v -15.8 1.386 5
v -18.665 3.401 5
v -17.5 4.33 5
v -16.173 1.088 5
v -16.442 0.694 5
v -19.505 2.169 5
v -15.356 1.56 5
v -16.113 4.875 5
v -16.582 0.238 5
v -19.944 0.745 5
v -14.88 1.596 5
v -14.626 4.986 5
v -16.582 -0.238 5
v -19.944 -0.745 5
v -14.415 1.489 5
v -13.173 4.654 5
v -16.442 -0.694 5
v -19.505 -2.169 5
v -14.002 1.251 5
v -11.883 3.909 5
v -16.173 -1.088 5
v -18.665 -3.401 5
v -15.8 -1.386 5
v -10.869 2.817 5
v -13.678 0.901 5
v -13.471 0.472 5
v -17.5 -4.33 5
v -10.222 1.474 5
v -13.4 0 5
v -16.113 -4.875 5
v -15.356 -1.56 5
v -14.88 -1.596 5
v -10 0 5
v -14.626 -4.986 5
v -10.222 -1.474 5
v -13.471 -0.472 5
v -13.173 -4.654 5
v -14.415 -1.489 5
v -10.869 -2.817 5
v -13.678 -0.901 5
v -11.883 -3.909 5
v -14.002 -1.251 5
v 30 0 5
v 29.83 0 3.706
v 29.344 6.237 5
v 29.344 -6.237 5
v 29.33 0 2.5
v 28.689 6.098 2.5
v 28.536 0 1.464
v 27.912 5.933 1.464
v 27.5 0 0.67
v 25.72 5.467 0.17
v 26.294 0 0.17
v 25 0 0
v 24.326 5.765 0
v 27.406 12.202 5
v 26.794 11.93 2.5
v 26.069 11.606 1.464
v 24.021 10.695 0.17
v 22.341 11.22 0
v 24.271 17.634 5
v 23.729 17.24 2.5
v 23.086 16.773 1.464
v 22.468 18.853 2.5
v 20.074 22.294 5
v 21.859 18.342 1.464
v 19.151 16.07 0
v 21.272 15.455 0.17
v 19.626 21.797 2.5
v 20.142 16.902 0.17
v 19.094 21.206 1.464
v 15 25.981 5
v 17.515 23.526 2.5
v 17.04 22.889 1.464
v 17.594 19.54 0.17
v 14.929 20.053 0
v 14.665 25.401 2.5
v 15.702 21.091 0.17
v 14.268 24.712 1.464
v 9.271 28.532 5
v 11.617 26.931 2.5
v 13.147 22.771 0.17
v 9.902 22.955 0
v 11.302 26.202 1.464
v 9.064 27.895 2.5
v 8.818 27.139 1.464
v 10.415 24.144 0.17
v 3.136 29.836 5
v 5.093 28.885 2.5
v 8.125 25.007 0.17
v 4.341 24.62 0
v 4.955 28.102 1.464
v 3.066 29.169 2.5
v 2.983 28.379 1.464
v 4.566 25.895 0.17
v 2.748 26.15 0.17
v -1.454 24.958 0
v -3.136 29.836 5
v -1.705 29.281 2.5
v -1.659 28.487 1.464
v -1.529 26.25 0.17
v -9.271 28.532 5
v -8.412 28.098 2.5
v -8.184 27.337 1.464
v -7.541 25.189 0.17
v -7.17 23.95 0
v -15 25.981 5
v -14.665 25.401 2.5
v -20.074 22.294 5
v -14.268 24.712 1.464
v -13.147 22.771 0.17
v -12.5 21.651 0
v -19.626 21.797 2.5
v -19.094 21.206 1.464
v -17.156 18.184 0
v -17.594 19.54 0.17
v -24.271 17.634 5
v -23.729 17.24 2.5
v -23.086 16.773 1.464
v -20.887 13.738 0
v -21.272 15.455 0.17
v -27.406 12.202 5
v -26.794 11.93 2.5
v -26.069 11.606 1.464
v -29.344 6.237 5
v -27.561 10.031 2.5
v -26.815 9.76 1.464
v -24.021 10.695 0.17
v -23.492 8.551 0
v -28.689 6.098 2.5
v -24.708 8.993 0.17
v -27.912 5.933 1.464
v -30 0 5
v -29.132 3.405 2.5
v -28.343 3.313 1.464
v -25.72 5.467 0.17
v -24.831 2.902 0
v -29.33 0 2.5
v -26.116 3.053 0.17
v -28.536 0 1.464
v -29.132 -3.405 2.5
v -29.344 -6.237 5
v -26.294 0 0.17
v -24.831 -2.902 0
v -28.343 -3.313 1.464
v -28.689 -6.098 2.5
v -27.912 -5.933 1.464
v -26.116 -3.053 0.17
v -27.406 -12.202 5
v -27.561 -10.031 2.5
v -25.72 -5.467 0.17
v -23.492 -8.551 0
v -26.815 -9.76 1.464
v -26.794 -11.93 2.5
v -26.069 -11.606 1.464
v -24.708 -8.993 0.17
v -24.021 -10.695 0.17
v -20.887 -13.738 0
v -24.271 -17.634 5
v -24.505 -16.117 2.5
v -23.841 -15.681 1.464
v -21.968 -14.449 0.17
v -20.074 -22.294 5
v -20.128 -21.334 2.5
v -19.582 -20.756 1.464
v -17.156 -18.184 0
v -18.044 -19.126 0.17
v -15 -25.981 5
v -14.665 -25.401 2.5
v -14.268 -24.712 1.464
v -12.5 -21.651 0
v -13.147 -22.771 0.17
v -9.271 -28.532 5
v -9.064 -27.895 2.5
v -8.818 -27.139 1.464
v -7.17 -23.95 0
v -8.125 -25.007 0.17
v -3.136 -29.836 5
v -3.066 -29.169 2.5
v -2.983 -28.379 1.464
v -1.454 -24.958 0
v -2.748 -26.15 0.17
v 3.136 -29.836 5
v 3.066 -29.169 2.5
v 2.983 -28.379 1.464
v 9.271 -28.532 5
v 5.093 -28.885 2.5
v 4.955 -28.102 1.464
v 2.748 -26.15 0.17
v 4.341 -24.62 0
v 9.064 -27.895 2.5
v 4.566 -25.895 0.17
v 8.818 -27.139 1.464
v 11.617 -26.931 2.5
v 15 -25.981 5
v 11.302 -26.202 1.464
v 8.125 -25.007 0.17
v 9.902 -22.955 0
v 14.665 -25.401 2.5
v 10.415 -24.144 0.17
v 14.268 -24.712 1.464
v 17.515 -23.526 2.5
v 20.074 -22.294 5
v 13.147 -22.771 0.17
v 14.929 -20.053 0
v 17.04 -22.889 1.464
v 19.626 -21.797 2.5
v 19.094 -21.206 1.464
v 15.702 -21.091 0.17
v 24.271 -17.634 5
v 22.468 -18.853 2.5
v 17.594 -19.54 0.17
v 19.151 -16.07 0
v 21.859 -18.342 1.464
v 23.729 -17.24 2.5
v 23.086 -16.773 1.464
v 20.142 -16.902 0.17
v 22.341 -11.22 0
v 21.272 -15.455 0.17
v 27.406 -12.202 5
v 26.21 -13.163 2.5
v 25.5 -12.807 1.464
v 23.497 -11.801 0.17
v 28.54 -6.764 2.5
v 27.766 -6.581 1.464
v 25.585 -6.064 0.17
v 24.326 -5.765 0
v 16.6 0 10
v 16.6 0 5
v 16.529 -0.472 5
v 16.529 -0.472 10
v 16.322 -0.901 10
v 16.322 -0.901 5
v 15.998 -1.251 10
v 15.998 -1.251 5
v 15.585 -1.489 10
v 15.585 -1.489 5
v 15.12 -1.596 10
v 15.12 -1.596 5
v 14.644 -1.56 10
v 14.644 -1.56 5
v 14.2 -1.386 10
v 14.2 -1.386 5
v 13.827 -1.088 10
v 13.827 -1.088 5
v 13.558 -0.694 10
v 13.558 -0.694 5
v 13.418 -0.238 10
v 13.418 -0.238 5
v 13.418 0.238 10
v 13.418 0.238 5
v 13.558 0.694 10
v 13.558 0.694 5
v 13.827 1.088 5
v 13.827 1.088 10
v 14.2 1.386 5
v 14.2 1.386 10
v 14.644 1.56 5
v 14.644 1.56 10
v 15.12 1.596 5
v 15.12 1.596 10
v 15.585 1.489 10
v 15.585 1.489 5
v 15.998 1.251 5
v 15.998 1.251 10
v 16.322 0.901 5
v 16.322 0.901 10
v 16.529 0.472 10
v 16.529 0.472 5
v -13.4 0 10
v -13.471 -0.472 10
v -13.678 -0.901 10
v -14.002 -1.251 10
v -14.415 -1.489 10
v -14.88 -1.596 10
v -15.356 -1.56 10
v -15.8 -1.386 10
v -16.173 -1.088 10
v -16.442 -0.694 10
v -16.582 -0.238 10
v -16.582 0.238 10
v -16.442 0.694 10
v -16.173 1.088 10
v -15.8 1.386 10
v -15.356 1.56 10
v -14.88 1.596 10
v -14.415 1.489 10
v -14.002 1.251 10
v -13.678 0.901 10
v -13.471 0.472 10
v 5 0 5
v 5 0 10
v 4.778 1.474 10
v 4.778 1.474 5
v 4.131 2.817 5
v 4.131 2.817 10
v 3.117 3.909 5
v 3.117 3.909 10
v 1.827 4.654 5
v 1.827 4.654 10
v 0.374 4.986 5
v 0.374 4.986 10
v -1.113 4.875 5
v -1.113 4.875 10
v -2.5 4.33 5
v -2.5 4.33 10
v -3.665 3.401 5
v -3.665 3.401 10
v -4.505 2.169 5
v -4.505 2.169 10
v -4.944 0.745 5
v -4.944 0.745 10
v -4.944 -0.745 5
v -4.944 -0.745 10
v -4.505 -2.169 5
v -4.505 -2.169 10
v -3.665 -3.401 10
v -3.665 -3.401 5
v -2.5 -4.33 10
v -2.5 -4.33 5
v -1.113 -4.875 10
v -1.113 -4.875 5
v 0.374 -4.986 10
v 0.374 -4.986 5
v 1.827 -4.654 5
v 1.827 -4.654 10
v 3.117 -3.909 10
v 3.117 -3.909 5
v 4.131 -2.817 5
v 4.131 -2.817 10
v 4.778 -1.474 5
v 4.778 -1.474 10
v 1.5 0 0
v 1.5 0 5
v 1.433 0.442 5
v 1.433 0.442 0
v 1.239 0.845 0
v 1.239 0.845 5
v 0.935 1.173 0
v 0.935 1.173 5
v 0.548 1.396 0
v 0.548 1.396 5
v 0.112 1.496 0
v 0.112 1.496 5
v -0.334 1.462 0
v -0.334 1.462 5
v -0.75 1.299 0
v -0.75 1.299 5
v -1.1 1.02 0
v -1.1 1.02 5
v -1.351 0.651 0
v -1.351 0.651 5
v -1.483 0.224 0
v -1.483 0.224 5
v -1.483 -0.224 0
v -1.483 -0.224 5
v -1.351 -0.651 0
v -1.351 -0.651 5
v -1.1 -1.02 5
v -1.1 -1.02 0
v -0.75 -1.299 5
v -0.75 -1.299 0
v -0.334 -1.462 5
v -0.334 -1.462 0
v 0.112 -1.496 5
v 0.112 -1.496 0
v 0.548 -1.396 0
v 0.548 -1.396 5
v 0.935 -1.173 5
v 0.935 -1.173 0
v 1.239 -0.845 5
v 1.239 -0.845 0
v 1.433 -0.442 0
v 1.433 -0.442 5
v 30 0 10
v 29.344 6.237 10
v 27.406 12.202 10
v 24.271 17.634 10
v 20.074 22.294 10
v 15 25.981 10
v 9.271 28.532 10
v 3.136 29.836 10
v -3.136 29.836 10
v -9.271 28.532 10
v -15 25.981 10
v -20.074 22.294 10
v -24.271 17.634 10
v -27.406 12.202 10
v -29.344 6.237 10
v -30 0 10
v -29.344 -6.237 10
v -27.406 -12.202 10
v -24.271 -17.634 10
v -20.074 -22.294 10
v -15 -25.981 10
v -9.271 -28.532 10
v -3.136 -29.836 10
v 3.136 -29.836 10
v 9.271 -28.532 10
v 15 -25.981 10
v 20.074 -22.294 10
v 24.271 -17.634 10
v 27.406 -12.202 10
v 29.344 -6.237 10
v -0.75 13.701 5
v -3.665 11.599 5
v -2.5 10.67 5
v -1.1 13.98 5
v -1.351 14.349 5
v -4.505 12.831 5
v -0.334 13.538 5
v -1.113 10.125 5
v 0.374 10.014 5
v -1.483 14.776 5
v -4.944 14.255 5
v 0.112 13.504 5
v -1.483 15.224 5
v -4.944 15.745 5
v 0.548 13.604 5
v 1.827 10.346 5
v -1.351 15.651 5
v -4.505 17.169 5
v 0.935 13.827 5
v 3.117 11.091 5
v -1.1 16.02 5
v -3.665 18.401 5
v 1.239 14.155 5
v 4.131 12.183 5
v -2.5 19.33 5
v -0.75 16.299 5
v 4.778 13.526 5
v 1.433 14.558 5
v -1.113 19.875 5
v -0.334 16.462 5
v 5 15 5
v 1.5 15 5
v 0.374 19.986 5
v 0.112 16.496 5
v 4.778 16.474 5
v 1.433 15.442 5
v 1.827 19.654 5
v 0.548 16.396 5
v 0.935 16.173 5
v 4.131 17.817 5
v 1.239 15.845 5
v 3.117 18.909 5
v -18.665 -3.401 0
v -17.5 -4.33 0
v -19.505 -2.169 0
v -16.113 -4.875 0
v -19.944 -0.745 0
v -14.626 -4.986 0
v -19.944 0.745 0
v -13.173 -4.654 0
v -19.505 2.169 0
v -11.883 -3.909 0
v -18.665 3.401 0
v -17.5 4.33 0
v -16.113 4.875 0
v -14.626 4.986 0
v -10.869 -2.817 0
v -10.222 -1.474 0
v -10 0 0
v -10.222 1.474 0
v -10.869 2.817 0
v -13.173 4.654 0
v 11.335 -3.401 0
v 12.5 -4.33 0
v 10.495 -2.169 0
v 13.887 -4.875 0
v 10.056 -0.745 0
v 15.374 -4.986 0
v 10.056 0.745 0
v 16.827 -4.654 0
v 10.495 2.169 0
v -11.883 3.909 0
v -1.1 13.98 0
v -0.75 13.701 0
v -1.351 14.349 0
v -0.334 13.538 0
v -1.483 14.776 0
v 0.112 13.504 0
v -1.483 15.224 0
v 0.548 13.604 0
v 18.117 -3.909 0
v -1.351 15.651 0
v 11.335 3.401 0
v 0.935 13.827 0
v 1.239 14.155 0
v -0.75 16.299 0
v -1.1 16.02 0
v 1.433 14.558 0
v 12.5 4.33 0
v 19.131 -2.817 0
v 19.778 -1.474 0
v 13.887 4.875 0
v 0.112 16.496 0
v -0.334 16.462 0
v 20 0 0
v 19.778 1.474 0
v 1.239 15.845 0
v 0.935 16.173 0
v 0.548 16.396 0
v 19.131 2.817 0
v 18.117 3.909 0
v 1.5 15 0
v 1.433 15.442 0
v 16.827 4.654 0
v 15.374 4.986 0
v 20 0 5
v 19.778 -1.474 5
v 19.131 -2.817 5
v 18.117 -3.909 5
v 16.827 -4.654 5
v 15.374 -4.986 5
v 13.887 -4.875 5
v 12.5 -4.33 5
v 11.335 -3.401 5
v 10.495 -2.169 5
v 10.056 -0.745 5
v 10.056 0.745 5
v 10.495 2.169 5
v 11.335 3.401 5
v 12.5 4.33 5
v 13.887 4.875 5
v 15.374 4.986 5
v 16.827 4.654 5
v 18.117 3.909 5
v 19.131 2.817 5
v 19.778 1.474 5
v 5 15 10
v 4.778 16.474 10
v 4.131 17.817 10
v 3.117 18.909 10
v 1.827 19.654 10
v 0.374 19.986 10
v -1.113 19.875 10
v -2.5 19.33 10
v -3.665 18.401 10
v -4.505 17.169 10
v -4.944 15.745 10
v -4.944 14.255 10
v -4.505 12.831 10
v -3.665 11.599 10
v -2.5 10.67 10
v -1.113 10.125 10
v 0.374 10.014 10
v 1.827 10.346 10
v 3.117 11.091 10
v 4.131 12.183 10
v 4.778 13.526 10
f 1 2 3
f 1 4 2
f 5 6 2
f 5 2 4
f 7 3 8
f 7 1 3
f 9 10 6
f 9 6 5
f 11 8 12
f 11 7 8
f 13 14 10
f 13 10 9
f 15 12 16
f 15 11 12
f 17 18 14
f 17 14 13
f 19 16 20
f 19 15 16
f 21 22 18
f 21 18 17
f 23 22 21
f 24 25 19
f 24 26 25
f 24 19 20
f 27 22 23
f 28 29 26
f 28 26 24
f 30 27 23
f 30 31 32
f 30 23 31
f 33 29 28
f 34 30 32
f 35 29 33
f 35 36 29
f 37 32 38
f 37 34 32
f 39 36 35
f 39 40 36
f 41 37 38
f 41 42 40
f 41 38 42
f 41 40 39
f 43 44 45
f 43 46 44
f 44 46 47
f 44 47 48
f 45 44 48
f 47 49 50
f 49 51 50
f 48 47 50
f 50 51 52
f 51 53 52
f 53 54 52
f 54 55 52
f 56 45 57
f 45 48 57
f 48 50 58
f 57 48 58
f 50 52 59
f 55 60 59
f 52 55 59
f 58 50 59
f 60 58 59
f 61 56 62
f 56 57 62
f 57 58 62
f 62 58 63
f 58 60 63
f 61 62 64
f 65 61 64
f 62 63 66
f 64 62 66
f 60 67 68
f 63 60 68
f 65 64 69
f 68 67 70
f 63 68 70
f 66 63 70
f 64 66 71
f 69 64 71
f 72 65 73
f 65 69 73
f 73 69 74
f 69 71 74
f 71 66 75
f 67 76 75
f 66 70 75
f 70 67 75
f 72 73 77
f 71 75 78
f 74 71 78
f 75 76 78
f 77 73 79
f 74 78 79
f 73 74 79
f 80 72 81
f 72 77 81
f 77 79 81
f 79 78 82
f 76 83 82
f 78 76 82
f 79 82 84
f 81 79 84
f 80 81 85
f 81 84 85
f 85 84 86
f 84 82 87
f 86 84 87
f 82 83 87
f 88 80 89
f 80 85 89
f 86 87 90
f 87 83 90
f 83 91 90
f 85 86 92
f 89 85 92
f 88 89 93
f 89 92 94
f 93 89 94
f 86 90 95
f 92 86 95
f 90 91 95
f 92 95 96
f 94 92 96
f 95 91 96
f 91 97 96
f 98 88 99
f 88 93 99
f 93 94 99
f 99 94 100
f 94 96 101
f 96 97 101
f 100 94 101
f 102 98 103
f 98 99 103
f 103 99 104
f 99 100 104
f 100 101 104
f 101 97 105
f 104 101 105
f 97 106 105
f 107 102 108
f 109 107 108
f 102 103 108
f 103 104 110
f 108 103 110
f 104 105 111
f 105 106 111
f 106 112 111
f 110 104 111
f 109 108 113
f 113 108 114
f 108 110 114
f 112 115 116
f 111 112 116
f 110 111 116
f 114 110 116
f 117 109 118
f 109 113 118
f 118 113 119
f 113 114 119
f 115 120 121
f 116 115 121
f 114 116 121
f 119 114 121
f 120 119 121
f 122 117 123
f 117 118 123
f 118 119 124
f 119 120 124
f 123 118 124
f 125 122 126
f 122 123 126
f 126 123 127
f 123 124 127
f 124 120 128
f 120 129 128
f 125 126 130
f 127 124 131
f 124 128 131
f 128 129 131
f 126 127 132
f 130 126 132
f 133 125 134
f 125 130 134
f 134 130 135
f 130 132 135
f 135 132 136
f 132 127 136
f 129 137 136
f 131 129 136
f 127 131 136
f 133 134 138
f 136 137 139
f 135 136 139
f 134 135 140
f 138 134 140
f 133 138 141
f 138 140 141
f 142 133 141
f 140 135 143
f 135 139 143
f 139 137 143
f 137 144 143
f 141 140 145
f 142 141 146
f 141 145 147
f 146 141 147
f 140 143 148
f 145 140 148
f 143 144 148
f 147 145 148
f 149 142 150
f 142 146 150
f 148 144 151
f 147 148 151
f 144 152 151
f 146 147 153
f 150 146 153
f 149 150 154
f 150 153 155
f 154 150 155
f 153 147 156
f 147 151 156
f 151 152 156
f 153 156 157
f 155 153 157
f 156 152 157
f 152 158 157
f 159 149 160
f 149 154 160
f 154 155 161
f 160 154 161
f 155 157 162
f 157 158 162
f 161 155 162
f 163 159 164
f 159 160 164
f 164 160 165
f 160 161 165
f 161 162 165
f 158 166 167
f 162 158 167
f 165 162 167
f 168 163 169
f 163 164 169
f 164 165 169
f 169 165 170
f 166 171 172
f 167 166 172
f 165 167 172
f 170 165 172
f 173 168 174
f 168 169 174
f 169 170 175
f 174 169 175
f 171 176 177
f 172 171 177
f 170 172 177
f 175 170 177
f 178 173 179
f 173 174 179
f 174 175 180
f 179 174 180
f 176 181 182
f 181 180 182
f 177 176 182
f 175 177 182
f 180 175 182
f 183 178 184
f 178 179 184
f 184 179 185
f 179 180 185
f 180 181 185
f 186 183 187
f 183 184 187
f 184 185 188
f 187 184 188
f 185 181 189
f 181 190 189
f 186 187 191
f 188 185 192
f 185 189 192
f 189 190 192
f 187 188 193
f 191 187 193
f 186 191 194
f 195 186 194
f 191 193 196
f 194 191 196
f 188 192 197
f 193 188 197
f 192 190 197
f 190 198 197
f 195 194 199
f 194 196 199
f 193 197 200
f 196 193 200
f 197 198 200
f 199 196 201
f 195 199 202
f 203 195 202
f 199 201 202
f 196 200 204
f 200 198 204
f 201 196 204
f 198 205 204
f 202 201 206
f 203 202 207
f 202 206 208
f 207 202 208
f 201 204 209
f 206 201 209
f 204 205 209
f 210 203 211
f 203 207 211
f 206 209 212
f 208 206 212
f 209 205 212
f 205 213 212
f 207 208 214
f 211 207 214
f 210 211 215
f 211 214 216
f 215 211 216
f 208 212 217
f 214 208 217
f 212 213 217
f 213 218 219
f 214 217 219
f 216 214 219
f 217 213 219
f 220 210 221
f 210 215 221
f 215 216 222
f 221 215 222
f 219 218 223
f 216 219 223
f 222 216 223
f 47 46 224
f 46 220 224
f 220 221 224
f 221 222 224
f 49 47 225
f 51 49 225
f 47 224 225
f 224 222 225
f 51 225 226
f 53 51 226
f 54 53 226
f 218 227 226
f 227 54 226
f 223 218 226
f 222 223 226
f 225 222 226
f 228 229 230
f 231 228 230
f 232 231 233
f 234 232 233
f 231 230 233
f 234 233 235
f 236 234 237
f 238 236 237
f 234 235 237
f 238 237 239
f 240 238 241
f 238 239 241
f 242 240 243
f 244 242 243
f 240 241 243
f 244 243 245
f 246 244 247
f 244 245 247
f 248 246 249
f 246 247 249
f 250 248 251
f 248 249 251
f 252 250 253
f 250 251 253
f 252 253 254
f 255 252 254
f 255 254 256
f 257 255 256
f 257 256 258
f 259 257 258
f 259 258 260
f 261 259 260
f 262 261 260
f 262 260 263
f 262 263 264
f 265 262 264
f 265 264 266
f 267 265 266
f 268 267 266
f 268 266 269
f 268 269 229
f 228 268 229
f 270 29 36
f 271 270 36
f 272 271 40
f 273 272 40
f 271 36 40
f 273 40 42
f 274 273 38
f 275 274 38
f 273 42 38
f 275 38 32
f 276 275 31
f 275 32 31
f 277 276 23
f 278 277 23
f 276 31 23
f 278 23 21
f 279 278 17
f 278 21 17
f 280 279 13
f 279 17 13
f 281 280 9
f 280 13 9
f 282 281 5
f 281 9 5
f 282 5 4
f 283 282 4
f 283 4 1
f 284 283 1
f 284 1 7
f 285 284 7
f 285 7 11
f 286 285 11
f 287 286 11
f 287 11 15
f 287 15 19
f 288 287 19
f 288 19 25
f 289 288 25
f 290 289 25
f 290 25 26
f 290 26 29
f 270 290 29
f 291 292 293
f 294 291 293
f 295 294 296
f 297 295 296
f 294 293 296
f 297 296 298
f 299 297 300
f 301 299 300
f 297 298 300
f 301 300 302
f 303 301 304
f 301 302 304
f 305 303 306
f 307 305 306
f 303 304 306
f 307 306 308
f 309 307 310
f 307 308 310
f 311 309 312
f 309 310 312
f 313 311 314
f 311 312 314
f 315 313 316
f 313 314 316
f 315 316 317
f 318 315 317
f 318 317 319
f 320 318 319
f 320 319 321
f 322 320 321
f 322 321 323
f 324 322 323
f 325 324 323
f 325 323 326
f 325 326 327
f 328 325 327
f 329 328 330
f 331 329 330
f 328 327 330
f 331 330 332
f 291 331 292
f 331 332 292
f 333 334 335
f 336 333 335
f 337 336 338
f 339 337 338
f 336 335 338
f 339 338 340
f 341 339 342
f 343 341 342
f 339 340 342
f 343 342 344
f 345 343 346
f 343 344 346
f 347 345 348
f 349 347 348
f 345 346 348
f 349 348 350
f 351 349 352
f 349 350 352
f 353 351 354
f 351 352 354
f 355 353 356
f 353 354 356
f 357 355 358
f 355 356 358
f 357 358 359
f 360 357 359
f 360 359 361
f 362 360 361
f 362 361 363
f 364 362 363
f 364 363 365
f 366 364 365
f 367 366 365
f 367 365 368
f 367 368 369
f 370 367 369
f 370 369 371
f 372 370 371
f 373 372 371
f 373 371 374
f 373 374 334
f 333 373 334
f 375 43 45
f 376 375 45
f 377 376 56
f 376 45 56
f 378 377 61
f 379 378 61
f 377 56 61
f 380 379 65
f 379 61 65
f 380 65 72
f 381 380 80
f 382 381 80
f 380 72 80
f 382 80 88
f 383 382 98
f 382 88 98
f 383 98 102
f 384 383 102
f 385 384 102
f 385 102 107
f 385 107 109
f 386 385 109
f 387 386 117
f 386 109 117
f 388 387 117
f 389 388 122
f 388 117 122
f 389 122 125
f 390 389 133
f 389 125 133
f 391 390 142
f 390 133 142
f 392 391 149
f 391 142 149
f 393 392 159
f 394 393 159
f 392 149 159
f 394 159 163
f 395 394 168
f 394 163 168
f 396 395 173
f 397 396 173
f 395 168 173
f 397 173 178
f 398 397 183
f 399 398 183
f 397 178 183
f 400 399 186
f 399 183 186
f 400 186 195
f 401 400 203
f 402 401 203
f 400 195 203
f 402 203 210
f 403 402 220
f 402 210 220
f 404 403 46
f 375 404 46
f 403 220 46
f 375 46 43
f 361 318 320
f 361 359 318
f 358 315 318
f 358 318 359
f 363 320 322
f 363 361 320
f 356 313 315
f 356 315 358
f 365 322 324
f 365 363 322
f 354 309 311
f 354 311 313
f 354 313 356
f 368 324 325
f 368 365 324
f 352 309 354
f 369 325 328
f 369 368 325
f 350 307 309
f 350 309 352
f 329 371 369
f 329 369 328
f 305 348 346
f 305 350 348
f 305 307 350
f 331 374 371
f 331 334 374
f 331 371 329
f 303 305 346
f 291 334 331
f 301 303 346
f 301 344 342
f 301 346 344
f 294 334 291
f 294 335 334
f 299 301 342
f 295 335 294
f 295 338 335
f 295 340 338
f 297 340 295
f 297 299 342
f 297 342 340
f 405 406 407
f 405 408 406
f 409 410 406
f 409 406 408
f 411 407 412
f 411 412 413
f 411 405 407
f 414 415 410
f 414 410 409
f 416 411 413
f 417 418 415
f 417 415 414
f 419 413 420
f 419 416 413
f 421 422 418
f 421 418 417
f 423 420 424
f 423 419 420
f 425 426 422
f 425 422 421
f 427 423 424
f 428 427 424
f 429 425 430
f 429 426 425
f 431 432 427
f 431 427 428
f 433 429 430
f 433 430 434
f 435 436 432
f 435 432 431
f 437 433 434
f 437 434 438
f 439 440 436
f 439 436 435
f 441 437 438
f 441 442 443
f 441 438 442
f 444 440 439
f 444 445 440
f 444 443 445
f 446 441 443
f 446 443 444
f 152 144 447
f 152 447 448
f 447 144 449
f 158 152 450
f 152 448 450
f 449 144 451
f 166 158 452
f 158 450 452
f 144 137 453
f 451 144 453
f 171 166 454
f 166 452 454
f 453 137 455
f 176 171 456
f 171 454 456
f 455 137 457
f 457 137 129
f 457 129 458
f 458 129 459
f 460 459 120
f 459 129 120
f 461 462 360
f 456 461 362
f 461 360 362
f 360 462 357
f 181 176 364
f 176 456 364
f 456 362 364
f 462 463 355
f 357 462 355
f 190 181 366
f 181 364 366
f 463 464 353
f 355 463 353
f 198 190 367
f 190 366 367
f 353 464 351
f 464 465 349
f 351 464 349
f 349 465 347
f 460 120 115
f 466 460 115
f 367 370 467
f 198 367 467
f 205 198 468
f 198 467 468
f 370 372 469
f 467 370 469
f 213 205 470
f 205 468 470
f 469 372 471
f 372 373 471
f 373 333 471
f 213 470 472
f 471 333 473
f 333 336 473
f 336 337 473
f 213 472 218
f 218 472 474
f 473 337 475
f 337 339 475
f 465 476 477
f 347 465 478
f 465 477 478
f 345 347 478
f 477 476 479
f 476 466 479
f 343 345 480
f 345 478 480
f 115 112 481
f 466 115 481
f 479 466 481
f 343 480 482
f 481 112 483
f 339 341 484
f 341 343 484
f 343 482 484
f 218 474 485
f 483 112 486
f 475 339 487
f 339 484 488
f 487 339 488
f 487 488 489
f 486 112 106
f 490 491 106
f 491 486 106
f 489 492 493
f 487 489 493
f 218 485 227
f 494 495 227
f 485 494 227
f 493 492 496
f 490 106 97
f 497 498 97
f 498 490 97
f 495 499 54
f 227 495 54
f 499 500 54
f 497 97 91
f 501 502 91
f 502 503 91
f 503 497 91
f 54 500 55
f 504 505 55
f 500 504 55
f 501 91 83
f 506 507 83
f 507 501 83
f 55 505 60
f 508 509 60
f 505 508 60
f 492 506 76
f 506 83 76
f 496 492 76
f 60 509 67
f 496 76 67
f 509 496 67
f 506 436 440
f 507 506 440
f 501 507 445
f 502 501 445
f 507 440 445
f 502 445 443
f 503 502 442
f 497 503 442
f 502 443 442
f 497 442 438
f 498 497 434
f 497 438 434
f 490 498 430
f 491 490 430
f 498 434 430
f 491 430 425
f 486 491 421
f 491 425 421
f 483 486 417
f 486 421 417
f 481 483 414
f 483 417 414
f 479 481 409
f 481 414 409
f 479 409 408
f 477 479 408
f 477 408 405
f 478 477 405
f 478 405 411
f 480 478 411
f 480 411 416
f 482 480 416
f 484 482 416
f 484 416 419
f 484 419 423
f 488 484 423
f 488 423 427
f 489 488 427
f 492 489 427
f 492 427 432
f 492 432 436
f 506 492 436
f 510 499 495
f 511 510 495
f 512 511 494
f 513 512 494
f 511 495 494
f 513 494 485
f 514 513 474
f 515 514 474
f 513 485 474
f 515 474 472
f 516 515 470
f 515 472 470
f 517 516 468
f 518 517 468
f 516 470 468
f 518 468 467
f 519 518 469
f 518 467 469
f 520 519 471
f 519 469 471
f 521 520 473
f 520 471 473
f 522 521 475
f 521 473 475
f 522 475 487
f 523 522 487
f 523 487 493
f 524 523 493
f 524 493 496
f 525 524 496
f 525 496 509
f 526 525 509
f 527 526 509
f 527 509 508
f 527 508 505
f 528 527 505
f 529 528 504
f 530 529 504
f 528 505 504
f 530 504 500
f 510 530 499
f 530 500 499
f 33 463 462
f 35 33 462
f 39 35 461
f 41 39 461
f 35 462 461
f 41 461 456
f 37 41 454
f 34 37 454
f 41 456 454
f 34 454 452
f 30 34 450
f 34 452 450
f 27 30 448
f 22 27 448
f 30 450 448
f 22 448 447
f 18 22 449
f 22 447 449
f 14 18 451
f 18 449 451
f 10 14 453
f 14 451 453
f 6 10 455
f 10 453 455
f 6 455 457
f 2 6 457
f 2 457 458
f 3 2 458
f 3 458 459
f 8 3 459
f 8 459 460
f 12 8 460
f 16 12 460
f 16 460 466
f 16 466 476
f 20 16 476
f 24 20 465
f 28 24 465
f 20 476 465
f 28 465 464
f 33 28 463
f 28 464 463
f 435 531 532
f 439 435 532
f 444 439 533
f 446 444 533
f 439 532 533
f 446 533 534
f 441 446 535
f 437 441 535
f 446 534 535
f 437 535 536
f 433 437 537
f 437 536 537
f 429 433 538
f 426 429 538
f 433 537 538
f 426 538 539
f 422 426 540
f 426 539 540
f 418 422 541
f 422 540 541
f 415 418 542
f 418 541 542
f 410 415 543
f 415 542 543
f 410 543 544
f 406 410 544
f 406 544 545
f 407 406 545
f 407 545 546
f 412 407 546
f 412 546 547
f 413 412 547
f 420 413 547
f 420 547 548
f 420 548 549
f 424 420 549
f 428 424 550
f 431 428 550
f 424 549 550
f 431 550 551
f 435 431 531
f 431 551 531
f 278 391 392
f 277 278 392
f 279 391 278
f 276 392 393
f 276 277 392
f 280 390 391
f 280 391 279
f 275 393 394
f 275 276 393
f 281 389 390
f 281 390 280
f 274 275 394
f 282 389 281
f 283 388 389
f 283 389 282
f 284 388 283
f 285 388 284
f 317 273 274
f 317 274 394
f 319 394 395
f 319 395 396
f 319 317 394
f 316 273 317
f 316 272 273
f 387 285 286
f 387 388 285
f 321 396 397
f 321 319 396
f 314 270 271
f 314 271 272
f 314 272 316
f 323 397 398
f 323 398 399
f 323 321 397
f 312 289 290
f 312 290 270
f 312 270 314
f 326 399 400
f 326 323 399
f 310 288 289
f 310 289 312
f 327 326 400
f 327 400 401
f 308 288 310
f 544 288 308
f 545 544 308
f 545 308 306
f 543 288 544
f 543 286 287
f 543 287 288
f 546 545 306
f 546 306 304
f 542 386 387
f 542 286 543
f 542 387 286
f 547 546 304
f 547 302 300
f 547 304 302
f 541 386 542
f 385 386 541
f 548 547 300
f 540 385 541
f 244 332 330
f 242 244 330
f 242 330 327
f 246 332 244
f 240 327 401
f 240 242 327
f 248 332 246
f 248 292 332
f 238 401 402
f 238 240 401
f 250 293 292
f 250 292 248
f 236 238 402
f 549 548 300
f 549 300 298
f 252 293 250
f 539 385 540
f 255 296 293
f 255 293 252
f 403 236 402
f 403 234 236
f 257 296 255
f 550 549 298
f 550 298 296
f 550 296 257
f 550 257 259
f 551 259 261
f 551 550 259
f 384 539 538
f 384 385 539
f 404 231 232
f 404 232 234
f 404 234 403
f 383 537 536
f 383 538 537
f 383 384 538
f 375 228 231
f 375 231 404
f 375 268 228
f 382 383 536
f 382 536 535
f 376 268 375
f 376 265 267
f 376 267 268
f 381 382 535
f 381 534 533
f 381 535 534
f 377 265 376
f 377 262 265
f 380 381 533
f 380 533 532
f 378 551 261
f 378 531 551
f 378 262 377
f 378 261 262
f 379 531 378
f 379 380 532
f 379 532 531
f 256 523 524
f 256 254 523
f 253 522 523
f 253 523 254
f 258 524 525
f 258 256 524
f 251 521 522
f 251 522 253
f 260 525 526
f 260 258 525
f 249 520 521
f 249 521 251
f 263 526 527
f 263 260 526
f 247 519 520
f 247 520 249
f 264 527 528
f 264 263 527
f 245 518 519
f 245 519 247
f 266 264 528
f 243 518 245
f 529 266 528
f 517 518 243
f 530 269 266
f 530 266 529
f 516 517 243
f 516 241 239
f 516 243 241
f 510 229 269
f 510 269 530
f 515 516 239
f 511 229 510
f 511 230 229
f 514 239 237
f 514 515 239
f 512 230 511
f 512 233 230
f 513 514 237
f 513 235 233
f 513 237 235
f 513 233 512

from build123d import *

# Parameters (mm, degrees)
SKETCH_R        = 30
PAD_DEPTH       = 10
SKETCH002_R     = 1.5
POCKET_DEPTH    = 10.001
SKETCH003_R     = 5
POCKET001_DEPTH = 5
SKETCH004_R     = 1.6
POCKET002_DEPTH = 10.001
SKETCH005_R     = 5
POCKET003_DEPTH = 5
FILLET_R        = 5


with BuildPart() as part:
    # Sketch → Pad (new body)
    with BuildSketch(Plane.XY):
        Circle(SKETCH_R)
    extrude(amount=PAD_DEPTH)

    # Sketch002 (on Face3 of Pad) → Pocket (cut, through all)
    with BuildSketch(Plane.XY.offset(10)):
        Circle(SKETCH002_R)
        with Locations((0, 15)):
            Circle(SKETCH002_R)
    extrude(amount=-POCKET_DEPTH, mode=Mode.SUBTRACT)

    # Sketch003 (on Face3 of Pocket) → Pocket001 (cut)
    with BuildSketch(Plane.XY.offset(10)):
        with Locations((0, 15)):
            Circle(SKETCH003_R)
        Circle(SKETCH003_R)
    extrude(amount=-POCKET001_DEPTH, mode=Mode.SUBTRACT)

    # Sketch004 (on Face2 of Pocket001) → Pocket002 (cut, through all)
    with BuildSketch(Plane(origin=(0, 0, 0), x_dir=(1, 0, 0), z_dir=(0, 0, -1))):
        with Locations((-15, 0)):
            Circle(SKETCH004_R)
        with Locations((15, 0)):
            Circle(SKETCH004_R)
    extrude(amount=-POCKET002_DEPTH, mode=Mode.SUBTRACT)

    # Sketch005 (on Face2 of Pocket002) → Pocket003 (cut)
    with BuildSketch(Plane(origin=(0, 0, 0), x_dir=(1, 0, 0), z_dir=(0, 0, -1))):
        with Locations((-15, 0)):
            Circle(SKETCH005_R)
        with Locations((15, 0)):
            Circle(SKETCH005_R)
    extrude(amount=-POCKET003_DEPTH, mode=Mode.SUBTRACT)

    # Fillet
    fillet_edges = [part.edges().sort_by_distance(p)[0] for p in [
        (-30, 0, 0),
    ]]
    fillet(fillet_edges, radius=FILLET_R)


solid = part.part
